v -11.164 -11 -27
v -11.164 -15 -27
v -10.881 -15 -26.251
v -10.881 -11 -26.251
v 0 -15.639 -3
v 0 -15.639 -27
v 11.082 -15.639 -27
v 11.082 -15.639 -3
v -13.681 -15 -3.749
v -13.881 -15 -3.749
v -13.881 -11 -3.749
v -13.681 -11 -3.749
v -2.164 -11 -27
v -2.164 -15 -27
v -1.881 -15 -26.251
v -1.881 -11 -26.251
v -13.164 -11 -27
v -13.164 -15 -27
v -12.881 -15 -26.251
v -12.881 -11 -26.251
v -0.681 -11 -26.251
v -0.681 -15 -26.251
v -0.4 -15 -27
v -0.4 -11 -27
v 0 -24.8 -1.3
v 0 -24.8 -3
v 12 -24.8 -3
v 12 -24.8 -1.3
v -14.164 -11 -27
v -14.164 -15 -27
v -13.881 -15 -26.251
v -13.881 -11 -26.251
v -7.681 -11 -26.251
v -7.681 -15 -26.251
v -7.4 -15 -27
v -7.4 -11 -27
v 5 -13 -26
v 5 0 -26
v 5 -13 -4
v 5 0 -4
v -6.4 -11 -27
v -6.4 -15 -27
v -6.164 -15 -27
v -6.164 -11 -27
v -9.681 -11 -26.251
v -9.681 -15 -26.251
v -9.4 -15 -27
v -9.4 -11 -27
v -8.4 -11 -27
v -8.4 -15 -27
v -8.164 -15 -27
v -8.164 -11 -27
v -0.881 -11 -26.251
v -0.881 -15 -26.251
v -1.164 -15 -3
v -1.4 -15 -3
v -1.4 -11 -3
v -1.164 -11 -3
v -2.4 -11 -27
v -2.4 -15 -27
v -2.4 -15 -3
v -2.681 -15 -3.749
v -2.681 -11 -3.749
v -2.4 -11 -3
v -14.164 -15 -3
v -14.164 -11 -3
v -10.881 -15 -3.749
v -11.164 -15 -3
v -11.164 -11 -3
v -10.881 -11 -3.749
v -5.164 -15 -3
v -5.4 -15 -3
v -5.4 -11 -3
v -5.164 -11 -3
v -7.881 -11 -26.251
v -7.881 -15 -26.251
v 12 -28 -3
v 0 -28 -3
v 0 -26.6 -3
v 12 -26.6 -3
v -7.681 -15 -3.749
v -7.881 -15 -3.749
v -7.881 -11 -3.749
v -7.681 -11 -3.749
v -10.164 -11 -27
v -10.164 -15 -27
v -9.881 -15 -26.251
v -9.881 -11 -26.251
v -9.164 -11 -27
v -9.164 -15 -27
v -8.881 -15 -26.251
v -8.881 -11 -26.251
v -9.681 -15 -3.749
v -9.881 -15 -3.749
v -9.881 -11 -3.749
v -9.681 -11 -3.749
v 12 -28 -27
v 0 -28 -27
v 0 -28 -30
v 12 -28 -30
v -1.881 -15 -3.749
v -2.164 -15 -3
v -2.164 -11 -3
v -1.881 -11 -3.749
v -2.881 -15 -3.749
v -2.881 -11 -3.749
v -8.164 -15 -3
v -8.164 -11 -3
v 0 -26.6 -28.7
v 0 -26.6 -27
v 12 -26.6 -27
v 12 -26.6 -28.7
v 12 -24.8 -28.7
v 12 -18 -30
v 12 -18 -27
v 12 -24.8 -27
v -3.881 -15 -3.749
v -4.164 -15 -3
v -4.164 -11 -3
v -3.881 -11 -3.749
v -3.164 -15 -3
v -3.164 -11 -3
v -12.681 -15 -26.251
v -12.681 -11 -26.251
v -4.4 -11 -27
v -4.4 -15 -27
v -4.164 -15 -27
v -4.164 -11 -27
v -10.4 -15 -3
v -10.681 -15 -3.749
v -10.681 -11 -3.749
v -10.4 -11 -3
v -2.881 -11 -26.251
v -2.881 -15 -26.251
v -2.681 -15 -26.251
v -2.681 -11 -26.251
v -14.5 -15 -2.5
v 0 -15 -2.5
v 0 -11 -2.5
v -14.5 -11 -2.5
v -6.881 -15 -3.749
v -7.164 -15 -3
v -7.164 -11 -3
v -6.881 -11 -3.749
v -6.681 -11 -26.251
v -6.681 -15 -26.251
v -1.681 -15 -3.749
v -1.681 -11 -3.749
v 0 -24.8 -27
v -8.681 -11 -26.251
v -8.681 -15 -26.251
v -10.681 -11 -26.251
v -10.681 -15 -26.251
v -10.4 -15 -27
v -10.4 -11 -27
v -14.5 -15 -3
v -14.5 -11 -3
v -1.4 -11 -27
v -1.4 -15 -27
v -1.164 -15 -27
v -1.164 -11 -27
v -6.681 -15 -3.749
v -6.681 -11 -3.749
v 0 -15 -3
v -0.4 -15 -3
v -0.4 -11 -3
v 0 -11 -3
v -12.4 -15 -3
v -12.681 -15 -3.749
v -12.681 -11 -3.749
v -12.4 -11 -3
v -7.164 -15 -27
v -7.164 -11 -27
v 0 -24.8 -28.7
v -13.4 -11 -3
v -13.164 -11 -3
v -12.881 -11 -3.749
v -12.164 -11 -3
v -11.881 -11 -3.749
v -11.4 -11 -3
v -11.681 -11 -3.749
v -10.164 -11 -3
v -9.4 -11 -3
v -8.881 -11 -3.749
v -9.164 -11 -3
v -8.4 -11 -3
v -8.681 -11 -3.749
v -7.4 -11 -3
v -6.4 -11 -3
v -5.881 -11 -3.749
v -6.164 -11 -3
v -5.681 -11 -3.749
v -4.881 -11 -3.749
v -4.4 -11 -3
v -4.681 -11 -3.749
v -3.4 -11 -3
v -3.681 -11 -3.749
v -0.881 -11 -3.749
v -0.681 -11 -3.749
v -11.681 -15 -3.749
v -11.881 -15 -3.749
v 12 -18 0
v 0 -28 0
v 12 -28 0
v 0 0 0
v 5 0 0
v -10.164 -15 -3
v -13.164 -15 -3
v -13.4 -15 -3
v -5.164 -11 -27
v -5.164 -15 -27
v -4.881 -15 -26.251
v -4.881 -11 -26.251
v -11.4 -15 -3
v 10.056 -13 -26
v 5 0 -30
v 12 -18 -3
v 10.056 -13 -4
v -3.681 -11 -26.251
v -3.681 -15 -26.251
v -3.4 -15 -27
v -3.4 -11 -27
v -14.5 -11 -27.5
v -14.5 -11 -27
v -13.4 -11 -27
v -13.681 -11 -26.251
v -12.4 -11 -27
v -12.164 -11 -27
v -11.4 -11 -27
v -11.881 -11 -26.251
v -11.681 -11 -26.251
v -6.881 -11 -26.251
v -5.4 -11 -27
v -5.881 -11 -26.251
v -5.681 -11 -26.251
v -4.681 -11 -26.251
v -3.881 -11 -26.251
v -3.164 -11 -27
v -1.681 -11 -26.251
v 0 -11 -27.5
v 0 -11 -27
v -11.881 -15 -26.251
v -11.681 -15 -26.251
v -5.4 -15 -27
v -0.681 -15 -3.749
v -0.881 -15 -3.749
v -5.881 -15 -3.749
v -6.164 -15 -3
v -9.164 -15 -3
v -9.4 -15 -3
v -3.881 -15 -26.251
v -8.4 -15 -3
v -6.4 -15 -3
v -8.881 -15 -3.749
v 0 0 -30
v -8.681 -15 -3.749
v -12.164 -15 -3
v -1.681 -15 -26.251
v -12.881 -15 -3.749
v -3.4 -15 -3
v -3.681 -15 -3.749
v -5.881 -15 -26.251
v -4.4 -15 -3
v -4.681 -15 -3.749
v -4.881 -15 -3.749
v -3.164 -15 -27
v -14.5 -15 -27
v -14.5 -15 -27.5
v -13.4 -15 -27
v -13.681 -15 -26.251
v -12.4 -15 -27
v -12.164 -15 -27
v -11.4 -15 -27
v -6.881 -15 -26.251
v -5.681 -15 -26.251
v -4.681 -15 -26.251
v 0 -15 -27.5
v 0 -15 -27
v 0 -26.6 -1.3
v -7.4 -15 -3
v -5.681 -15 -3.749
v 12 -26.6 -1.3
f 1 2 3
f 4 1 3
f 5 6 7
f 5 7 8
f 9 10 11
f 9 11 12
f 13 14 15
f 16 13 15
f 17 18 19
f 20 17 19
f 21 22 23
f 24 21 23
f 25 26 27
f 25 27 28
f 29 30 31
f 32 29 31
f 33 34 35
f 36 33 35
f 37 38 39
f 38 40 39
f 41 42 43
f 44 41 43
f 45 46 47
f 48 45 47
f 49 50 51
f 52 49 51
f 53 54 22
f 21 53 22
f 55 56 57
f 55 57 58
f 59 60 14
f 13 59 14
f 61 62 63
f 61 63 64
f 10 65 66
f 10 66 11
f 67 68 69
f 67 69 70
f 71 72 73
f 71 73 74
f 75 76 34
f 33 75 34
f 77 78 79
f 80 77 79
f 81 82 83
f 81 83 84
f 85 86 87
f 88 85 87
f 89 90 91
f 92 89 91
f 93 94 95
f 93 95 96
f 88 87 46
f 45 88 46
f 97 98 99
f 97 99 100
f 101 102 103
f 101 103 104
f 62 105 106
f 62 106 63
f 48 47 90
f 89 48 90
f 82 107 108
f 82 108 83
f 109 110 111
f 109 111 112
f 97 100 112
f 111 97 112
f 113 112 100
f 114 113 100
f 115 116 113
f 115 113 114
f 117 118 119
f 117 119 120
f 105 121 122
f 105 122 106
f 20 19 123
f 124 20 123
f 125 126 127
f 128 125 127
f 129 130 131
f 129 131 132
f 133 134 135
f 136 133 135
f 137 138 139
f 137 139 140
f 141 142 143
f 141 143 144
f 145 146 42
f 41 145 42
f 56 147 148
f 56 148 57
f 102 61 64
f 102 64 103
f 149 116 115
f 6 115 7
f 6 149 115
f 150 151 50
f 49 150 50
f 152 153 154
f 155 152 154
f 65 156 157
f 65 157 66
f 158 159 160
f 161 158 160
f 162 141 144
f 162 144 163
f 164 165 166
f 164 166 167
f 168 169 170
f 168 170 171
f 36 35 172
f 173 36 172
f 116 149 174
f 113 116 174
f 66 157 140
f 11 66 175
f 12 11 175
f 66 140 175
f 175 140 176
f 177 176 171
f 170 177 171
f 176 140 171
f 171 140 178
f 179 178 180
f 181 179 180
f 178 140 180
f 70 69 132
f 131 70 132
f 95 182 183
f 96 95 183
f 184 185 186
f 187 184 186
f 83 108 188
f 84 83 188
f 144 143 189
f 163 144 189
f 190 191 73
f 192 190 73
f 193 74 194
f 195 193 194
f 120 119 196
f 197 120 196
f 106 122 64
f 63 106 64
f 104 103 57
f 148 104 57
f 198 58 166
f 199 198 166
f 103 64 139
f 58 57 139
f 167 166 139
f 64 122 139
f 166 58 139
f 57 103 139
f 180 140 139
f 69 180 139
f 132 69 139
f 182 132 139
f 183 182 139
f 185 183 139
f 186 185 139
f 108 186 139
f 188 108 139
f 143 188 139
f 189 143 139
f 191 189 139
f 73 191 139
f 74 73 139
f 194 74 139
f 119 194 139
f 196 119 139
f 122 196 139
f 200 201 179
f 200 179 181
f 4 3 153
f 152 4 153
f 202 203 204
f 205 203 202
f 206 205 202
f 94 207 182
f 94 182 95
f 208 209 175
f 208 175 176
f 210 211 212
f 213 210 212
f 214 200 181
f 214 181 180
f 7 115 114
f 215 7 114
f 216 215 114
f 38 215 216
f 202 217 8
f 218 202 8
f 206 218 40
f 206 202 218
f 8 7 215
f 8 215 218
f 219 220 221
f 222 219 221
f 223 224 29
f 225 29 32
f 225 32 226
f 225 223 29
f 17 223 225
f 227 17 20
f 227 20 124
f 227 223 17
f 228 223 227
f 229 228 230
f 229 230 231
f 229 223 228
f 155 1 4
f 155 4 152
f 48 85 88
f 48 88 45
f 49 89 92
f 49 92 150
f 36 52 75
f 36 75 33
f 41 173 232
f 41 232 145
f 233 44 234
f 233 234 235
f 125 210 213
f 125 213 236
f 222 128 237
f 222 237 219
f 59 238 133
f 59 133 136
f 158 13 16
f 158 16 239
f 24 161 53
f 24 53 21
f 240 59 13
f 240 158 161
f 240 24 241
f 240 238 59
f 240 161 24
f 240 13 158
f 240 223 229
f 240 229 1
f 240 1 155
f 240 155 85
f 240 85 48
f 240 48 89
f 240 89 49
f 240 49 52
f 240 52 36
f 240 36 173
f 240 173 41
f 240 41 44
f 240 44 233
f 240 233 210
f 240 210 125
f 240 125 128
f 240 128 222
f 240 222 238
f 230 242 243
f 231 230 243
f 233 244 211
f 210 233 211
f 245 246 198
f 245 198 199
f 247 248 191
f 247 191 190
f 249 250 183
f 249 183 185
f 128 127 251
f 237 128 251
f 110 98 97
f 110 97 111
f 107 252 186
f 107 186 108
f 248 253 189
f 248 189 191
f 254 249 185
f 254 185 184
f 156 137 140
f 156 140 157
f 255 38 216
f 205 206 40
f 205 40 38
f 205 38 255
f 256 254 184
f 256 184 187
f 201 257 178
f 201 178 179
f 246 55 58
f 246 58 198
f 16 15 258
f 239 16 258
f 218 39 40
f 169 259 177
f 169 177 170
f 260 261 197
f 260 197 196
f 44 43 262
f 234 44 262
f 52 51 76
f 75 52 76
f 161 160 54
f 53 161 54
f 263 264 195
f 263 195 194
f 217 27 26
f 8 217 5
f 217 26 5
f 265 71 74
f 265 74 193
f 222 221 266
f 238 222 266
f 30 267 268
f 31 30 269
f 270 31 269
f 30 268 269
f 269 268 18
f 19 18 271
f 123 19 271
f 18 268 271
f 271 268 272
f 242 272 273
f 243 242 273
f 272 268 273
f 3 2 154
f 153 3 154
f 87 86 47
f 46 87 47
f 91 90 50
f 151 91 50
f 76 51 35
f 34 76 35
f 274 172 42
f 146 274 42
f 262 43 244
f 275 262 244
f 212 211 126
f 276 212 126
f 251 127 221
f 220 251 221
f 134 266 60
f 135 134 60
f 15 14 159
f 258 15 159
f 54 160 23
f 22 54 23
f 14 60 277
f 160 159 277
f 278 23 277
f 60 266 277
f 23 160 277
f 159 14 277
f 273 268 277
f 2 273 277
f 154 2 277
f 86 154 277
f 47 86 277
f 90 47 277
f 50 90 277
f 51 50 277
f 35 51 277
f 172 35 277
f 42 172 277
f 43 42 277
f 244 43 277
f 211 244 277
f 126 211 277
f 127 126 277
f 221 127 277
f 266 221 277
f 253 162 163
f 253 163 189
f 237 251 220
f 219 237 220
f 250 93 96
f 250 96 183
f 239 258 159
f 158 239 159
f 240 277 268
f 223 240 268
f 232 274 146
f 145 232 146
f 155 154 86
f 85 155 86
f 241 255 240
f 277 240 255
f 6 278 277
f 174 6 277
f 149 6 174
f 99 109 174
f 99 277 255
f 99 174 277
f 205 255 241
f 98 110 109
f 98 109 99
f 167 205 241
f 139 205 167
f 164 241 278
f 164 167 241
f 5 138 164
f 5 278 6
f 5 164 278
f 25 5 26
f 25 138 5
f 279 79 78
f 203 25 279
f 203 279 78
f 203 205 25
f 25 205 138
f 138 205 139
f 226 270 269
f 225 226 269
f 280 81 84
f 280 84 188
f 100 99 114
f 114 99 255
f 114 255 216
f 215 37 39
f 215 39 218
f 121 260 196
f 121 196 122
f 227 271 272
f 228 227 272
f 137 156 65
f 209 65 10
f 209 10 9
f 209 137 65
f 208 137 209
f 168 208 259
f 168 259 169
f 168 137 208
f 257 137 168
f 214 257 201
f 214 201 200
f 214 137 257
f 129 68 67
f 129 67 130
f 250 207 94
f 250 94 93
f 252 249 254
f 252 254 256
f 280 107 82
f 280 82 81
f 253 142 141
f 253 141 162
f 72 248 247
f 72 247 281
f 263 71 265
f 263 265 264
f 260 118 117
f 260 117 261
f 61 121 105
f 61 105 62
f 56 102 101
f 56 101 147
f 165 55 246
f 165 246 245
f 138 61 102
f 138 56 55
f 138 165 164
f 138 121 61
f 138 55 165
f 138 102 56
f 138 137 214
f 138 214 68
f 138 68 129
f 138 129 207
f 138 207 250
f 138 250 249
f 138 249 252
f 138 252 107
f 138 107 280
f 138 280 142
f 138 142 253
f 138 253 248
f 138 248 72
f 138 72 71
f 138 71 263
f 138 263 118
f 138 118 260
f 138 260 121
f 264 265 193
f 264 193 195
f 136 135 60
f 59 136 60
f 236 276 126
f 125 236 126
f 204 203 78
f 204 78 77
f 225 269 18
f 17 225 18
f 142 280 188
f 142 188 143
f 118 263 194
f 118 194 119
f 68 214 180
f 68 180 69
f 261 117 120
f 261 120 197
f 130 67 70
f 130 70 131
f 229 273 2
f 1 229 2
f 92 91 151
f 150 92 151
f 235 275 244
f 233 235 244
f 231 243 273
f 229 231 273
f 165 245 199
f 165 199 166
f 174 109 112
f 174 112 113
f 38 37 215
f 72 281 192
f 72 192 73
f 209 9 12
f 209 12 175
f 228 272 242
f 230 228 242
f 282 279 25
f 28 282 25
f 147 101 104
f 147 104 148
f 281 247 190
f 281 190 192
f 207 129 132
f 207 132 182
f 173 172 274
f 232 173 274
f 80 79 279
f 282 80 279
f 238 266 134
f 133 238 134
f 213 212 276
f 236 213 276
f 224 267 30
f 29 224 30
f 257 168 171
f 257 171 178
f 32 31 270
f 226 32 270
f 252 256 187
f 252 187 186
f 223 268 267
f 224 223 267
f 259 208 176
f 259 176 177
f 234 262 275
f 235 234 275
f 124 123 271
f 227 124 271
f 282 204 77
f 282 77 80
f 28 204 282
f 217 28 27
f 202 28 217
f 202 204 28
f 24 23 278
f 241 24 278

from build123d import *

# Parameters (mm, degrees)
BOSS_EXTRUDE1_DEPTH = 30
SKETCH4_W           = 24
SKETCH4_H           = 14
CUT_EXTRUDE2_DEPTH  = 25
SKETCH5_W           = 1.7
SKETCH5_H           = 1.8
CUT_EXTRUDE3_DEPTH  = 15
CUT_EXTRUDE4_DEPTH  = 11
BOSS_EXTRUDE2_DEPTH = 4


with BuildPart() as part:
    # Sketch1 → Boss-Extrude1 (new body)
    with BuildSketch(Plane.XY):
        Polygon((0, 0), (0, -28), (12, -28), (12, -18), (5, 0), align=None)
    extrude(amount=-BOSS_EXTRUDE1_DEPTH)

    # Sketch4 → Cut-Extrude2 (cut)
    with BuildSketch(Plane.ZY):
        with Locations((-15, -22.638599401)):
            Rectangle(SKETCH4_W, SKETCH4_H)
    extrude(amount=-CUT_EXTRUDE2_DEPTH, mode=Mode.SUBTRACT)

    # Sketch5 → Cut-Extrude3 (cut)
    with BuildSketch(Plane.ZY):
        with Locations((-2.15, -25.7)):
            Rectangle(SKETCH5_W, SKETCH5_H)
    cut_extrude3 = extrude(amount=-CUT_EXTRUDE3_DEPTH, mode=Mode.SUBTRACT)

    # Mirror1: Cut-Extrude3 across plane
    add(cut_extrude3.mirror(Plane.XY.offset(-15)), mode=Mode.SUBTRACT)

    # Sketch6 → Cut-Extrude4 (cut, symmetric)
    with BuildSketch(Plane.XY.offset(-15)):
        Polygon((5, 0), (5, -13), (10.055555556, -13), align=None)
    extrude(amount=CUT_EXTRUDE4_DEPTH, both=True, mode=Mode.SUBTRACT)

    # Sketch7 → Boss-Extrude2 (add)
    with BuildSketch(Plane(origin=(0, -15, 0), x_dir=(1, 0, 0), z_dir=(0, 1, 0))):
        Polygon((0, 27.5), (-14.5, 27.5), (-14.5, 27), (-14.164444468, 27), (-13.881153369, 26.251032188), (-13.681153369, 26.251032188), (-13.4, 27), (-13.164444468, 27), (-12.881153369, 26.251032188), (-12.681153369, 26.251032188), (-12.4, 27), (-12.164444468, 27), (-11.881153369, 26.251032188), (-11.681153369, 26.251032188), (-11.4, 27), (-11.164444468, 27), (-10.881153369, 26.251032188), (-10.681153369, 26.251032188), (-10.4, 27), (-10.164444468, 27), (-9.881153369, 26.251032188), (-9.681153369, 26.251032188), (-9.4, 27), (-9.164444468, 27), (-8.881153369, 26.251032188), (-8.681153369, 26.251032188), (-8.4, 27), (-8.164444468, 27), (-7.881153369, 26.251032188), (-7.681153369, 26.251032188), (-7.4, 27), (-7.164444468, 27), (-6.881153369, 26.251032188), (-6.681153369, 26.251032188), (-6.4, 27), (-6.164444468, 27), (-5.881153369, 26.251032188), (-5.681153369, 26.251032188), (-5.4, 27), (-5.164444468, 27), (-4.881153369, 26.251032188), (-4.681153369, 26.251032188), (-4.4, 27), (-4.164444468, 27), (-3.881153369, 26.251032188), (-3.681153369, 26.251032188), (-3.4, 27), (-3.164444468, 27), (-2.881153369, 26.251032188), (-2.681153369, 26.251032188), (-2.4, 27), (-2.164444468, 27), (-1.881153369, 26.251032188), (-1.681153369, 26.251032188), (-1.4, 27), (-1.164444468, 27), (-0.881153369, 26.251032188), (-0.681153369, 26.251032188), (-0.4, 27), (0, 27), align=None)
    boss_extrude2 = extrude(amount=BOSS_EXTRUDE2_DEPTH)

    # Mirror2: Boss-Extrude2 across plane
    add(boss_extrude2.mirror(Plane.XY.offset(-15)))


solid = part.part
